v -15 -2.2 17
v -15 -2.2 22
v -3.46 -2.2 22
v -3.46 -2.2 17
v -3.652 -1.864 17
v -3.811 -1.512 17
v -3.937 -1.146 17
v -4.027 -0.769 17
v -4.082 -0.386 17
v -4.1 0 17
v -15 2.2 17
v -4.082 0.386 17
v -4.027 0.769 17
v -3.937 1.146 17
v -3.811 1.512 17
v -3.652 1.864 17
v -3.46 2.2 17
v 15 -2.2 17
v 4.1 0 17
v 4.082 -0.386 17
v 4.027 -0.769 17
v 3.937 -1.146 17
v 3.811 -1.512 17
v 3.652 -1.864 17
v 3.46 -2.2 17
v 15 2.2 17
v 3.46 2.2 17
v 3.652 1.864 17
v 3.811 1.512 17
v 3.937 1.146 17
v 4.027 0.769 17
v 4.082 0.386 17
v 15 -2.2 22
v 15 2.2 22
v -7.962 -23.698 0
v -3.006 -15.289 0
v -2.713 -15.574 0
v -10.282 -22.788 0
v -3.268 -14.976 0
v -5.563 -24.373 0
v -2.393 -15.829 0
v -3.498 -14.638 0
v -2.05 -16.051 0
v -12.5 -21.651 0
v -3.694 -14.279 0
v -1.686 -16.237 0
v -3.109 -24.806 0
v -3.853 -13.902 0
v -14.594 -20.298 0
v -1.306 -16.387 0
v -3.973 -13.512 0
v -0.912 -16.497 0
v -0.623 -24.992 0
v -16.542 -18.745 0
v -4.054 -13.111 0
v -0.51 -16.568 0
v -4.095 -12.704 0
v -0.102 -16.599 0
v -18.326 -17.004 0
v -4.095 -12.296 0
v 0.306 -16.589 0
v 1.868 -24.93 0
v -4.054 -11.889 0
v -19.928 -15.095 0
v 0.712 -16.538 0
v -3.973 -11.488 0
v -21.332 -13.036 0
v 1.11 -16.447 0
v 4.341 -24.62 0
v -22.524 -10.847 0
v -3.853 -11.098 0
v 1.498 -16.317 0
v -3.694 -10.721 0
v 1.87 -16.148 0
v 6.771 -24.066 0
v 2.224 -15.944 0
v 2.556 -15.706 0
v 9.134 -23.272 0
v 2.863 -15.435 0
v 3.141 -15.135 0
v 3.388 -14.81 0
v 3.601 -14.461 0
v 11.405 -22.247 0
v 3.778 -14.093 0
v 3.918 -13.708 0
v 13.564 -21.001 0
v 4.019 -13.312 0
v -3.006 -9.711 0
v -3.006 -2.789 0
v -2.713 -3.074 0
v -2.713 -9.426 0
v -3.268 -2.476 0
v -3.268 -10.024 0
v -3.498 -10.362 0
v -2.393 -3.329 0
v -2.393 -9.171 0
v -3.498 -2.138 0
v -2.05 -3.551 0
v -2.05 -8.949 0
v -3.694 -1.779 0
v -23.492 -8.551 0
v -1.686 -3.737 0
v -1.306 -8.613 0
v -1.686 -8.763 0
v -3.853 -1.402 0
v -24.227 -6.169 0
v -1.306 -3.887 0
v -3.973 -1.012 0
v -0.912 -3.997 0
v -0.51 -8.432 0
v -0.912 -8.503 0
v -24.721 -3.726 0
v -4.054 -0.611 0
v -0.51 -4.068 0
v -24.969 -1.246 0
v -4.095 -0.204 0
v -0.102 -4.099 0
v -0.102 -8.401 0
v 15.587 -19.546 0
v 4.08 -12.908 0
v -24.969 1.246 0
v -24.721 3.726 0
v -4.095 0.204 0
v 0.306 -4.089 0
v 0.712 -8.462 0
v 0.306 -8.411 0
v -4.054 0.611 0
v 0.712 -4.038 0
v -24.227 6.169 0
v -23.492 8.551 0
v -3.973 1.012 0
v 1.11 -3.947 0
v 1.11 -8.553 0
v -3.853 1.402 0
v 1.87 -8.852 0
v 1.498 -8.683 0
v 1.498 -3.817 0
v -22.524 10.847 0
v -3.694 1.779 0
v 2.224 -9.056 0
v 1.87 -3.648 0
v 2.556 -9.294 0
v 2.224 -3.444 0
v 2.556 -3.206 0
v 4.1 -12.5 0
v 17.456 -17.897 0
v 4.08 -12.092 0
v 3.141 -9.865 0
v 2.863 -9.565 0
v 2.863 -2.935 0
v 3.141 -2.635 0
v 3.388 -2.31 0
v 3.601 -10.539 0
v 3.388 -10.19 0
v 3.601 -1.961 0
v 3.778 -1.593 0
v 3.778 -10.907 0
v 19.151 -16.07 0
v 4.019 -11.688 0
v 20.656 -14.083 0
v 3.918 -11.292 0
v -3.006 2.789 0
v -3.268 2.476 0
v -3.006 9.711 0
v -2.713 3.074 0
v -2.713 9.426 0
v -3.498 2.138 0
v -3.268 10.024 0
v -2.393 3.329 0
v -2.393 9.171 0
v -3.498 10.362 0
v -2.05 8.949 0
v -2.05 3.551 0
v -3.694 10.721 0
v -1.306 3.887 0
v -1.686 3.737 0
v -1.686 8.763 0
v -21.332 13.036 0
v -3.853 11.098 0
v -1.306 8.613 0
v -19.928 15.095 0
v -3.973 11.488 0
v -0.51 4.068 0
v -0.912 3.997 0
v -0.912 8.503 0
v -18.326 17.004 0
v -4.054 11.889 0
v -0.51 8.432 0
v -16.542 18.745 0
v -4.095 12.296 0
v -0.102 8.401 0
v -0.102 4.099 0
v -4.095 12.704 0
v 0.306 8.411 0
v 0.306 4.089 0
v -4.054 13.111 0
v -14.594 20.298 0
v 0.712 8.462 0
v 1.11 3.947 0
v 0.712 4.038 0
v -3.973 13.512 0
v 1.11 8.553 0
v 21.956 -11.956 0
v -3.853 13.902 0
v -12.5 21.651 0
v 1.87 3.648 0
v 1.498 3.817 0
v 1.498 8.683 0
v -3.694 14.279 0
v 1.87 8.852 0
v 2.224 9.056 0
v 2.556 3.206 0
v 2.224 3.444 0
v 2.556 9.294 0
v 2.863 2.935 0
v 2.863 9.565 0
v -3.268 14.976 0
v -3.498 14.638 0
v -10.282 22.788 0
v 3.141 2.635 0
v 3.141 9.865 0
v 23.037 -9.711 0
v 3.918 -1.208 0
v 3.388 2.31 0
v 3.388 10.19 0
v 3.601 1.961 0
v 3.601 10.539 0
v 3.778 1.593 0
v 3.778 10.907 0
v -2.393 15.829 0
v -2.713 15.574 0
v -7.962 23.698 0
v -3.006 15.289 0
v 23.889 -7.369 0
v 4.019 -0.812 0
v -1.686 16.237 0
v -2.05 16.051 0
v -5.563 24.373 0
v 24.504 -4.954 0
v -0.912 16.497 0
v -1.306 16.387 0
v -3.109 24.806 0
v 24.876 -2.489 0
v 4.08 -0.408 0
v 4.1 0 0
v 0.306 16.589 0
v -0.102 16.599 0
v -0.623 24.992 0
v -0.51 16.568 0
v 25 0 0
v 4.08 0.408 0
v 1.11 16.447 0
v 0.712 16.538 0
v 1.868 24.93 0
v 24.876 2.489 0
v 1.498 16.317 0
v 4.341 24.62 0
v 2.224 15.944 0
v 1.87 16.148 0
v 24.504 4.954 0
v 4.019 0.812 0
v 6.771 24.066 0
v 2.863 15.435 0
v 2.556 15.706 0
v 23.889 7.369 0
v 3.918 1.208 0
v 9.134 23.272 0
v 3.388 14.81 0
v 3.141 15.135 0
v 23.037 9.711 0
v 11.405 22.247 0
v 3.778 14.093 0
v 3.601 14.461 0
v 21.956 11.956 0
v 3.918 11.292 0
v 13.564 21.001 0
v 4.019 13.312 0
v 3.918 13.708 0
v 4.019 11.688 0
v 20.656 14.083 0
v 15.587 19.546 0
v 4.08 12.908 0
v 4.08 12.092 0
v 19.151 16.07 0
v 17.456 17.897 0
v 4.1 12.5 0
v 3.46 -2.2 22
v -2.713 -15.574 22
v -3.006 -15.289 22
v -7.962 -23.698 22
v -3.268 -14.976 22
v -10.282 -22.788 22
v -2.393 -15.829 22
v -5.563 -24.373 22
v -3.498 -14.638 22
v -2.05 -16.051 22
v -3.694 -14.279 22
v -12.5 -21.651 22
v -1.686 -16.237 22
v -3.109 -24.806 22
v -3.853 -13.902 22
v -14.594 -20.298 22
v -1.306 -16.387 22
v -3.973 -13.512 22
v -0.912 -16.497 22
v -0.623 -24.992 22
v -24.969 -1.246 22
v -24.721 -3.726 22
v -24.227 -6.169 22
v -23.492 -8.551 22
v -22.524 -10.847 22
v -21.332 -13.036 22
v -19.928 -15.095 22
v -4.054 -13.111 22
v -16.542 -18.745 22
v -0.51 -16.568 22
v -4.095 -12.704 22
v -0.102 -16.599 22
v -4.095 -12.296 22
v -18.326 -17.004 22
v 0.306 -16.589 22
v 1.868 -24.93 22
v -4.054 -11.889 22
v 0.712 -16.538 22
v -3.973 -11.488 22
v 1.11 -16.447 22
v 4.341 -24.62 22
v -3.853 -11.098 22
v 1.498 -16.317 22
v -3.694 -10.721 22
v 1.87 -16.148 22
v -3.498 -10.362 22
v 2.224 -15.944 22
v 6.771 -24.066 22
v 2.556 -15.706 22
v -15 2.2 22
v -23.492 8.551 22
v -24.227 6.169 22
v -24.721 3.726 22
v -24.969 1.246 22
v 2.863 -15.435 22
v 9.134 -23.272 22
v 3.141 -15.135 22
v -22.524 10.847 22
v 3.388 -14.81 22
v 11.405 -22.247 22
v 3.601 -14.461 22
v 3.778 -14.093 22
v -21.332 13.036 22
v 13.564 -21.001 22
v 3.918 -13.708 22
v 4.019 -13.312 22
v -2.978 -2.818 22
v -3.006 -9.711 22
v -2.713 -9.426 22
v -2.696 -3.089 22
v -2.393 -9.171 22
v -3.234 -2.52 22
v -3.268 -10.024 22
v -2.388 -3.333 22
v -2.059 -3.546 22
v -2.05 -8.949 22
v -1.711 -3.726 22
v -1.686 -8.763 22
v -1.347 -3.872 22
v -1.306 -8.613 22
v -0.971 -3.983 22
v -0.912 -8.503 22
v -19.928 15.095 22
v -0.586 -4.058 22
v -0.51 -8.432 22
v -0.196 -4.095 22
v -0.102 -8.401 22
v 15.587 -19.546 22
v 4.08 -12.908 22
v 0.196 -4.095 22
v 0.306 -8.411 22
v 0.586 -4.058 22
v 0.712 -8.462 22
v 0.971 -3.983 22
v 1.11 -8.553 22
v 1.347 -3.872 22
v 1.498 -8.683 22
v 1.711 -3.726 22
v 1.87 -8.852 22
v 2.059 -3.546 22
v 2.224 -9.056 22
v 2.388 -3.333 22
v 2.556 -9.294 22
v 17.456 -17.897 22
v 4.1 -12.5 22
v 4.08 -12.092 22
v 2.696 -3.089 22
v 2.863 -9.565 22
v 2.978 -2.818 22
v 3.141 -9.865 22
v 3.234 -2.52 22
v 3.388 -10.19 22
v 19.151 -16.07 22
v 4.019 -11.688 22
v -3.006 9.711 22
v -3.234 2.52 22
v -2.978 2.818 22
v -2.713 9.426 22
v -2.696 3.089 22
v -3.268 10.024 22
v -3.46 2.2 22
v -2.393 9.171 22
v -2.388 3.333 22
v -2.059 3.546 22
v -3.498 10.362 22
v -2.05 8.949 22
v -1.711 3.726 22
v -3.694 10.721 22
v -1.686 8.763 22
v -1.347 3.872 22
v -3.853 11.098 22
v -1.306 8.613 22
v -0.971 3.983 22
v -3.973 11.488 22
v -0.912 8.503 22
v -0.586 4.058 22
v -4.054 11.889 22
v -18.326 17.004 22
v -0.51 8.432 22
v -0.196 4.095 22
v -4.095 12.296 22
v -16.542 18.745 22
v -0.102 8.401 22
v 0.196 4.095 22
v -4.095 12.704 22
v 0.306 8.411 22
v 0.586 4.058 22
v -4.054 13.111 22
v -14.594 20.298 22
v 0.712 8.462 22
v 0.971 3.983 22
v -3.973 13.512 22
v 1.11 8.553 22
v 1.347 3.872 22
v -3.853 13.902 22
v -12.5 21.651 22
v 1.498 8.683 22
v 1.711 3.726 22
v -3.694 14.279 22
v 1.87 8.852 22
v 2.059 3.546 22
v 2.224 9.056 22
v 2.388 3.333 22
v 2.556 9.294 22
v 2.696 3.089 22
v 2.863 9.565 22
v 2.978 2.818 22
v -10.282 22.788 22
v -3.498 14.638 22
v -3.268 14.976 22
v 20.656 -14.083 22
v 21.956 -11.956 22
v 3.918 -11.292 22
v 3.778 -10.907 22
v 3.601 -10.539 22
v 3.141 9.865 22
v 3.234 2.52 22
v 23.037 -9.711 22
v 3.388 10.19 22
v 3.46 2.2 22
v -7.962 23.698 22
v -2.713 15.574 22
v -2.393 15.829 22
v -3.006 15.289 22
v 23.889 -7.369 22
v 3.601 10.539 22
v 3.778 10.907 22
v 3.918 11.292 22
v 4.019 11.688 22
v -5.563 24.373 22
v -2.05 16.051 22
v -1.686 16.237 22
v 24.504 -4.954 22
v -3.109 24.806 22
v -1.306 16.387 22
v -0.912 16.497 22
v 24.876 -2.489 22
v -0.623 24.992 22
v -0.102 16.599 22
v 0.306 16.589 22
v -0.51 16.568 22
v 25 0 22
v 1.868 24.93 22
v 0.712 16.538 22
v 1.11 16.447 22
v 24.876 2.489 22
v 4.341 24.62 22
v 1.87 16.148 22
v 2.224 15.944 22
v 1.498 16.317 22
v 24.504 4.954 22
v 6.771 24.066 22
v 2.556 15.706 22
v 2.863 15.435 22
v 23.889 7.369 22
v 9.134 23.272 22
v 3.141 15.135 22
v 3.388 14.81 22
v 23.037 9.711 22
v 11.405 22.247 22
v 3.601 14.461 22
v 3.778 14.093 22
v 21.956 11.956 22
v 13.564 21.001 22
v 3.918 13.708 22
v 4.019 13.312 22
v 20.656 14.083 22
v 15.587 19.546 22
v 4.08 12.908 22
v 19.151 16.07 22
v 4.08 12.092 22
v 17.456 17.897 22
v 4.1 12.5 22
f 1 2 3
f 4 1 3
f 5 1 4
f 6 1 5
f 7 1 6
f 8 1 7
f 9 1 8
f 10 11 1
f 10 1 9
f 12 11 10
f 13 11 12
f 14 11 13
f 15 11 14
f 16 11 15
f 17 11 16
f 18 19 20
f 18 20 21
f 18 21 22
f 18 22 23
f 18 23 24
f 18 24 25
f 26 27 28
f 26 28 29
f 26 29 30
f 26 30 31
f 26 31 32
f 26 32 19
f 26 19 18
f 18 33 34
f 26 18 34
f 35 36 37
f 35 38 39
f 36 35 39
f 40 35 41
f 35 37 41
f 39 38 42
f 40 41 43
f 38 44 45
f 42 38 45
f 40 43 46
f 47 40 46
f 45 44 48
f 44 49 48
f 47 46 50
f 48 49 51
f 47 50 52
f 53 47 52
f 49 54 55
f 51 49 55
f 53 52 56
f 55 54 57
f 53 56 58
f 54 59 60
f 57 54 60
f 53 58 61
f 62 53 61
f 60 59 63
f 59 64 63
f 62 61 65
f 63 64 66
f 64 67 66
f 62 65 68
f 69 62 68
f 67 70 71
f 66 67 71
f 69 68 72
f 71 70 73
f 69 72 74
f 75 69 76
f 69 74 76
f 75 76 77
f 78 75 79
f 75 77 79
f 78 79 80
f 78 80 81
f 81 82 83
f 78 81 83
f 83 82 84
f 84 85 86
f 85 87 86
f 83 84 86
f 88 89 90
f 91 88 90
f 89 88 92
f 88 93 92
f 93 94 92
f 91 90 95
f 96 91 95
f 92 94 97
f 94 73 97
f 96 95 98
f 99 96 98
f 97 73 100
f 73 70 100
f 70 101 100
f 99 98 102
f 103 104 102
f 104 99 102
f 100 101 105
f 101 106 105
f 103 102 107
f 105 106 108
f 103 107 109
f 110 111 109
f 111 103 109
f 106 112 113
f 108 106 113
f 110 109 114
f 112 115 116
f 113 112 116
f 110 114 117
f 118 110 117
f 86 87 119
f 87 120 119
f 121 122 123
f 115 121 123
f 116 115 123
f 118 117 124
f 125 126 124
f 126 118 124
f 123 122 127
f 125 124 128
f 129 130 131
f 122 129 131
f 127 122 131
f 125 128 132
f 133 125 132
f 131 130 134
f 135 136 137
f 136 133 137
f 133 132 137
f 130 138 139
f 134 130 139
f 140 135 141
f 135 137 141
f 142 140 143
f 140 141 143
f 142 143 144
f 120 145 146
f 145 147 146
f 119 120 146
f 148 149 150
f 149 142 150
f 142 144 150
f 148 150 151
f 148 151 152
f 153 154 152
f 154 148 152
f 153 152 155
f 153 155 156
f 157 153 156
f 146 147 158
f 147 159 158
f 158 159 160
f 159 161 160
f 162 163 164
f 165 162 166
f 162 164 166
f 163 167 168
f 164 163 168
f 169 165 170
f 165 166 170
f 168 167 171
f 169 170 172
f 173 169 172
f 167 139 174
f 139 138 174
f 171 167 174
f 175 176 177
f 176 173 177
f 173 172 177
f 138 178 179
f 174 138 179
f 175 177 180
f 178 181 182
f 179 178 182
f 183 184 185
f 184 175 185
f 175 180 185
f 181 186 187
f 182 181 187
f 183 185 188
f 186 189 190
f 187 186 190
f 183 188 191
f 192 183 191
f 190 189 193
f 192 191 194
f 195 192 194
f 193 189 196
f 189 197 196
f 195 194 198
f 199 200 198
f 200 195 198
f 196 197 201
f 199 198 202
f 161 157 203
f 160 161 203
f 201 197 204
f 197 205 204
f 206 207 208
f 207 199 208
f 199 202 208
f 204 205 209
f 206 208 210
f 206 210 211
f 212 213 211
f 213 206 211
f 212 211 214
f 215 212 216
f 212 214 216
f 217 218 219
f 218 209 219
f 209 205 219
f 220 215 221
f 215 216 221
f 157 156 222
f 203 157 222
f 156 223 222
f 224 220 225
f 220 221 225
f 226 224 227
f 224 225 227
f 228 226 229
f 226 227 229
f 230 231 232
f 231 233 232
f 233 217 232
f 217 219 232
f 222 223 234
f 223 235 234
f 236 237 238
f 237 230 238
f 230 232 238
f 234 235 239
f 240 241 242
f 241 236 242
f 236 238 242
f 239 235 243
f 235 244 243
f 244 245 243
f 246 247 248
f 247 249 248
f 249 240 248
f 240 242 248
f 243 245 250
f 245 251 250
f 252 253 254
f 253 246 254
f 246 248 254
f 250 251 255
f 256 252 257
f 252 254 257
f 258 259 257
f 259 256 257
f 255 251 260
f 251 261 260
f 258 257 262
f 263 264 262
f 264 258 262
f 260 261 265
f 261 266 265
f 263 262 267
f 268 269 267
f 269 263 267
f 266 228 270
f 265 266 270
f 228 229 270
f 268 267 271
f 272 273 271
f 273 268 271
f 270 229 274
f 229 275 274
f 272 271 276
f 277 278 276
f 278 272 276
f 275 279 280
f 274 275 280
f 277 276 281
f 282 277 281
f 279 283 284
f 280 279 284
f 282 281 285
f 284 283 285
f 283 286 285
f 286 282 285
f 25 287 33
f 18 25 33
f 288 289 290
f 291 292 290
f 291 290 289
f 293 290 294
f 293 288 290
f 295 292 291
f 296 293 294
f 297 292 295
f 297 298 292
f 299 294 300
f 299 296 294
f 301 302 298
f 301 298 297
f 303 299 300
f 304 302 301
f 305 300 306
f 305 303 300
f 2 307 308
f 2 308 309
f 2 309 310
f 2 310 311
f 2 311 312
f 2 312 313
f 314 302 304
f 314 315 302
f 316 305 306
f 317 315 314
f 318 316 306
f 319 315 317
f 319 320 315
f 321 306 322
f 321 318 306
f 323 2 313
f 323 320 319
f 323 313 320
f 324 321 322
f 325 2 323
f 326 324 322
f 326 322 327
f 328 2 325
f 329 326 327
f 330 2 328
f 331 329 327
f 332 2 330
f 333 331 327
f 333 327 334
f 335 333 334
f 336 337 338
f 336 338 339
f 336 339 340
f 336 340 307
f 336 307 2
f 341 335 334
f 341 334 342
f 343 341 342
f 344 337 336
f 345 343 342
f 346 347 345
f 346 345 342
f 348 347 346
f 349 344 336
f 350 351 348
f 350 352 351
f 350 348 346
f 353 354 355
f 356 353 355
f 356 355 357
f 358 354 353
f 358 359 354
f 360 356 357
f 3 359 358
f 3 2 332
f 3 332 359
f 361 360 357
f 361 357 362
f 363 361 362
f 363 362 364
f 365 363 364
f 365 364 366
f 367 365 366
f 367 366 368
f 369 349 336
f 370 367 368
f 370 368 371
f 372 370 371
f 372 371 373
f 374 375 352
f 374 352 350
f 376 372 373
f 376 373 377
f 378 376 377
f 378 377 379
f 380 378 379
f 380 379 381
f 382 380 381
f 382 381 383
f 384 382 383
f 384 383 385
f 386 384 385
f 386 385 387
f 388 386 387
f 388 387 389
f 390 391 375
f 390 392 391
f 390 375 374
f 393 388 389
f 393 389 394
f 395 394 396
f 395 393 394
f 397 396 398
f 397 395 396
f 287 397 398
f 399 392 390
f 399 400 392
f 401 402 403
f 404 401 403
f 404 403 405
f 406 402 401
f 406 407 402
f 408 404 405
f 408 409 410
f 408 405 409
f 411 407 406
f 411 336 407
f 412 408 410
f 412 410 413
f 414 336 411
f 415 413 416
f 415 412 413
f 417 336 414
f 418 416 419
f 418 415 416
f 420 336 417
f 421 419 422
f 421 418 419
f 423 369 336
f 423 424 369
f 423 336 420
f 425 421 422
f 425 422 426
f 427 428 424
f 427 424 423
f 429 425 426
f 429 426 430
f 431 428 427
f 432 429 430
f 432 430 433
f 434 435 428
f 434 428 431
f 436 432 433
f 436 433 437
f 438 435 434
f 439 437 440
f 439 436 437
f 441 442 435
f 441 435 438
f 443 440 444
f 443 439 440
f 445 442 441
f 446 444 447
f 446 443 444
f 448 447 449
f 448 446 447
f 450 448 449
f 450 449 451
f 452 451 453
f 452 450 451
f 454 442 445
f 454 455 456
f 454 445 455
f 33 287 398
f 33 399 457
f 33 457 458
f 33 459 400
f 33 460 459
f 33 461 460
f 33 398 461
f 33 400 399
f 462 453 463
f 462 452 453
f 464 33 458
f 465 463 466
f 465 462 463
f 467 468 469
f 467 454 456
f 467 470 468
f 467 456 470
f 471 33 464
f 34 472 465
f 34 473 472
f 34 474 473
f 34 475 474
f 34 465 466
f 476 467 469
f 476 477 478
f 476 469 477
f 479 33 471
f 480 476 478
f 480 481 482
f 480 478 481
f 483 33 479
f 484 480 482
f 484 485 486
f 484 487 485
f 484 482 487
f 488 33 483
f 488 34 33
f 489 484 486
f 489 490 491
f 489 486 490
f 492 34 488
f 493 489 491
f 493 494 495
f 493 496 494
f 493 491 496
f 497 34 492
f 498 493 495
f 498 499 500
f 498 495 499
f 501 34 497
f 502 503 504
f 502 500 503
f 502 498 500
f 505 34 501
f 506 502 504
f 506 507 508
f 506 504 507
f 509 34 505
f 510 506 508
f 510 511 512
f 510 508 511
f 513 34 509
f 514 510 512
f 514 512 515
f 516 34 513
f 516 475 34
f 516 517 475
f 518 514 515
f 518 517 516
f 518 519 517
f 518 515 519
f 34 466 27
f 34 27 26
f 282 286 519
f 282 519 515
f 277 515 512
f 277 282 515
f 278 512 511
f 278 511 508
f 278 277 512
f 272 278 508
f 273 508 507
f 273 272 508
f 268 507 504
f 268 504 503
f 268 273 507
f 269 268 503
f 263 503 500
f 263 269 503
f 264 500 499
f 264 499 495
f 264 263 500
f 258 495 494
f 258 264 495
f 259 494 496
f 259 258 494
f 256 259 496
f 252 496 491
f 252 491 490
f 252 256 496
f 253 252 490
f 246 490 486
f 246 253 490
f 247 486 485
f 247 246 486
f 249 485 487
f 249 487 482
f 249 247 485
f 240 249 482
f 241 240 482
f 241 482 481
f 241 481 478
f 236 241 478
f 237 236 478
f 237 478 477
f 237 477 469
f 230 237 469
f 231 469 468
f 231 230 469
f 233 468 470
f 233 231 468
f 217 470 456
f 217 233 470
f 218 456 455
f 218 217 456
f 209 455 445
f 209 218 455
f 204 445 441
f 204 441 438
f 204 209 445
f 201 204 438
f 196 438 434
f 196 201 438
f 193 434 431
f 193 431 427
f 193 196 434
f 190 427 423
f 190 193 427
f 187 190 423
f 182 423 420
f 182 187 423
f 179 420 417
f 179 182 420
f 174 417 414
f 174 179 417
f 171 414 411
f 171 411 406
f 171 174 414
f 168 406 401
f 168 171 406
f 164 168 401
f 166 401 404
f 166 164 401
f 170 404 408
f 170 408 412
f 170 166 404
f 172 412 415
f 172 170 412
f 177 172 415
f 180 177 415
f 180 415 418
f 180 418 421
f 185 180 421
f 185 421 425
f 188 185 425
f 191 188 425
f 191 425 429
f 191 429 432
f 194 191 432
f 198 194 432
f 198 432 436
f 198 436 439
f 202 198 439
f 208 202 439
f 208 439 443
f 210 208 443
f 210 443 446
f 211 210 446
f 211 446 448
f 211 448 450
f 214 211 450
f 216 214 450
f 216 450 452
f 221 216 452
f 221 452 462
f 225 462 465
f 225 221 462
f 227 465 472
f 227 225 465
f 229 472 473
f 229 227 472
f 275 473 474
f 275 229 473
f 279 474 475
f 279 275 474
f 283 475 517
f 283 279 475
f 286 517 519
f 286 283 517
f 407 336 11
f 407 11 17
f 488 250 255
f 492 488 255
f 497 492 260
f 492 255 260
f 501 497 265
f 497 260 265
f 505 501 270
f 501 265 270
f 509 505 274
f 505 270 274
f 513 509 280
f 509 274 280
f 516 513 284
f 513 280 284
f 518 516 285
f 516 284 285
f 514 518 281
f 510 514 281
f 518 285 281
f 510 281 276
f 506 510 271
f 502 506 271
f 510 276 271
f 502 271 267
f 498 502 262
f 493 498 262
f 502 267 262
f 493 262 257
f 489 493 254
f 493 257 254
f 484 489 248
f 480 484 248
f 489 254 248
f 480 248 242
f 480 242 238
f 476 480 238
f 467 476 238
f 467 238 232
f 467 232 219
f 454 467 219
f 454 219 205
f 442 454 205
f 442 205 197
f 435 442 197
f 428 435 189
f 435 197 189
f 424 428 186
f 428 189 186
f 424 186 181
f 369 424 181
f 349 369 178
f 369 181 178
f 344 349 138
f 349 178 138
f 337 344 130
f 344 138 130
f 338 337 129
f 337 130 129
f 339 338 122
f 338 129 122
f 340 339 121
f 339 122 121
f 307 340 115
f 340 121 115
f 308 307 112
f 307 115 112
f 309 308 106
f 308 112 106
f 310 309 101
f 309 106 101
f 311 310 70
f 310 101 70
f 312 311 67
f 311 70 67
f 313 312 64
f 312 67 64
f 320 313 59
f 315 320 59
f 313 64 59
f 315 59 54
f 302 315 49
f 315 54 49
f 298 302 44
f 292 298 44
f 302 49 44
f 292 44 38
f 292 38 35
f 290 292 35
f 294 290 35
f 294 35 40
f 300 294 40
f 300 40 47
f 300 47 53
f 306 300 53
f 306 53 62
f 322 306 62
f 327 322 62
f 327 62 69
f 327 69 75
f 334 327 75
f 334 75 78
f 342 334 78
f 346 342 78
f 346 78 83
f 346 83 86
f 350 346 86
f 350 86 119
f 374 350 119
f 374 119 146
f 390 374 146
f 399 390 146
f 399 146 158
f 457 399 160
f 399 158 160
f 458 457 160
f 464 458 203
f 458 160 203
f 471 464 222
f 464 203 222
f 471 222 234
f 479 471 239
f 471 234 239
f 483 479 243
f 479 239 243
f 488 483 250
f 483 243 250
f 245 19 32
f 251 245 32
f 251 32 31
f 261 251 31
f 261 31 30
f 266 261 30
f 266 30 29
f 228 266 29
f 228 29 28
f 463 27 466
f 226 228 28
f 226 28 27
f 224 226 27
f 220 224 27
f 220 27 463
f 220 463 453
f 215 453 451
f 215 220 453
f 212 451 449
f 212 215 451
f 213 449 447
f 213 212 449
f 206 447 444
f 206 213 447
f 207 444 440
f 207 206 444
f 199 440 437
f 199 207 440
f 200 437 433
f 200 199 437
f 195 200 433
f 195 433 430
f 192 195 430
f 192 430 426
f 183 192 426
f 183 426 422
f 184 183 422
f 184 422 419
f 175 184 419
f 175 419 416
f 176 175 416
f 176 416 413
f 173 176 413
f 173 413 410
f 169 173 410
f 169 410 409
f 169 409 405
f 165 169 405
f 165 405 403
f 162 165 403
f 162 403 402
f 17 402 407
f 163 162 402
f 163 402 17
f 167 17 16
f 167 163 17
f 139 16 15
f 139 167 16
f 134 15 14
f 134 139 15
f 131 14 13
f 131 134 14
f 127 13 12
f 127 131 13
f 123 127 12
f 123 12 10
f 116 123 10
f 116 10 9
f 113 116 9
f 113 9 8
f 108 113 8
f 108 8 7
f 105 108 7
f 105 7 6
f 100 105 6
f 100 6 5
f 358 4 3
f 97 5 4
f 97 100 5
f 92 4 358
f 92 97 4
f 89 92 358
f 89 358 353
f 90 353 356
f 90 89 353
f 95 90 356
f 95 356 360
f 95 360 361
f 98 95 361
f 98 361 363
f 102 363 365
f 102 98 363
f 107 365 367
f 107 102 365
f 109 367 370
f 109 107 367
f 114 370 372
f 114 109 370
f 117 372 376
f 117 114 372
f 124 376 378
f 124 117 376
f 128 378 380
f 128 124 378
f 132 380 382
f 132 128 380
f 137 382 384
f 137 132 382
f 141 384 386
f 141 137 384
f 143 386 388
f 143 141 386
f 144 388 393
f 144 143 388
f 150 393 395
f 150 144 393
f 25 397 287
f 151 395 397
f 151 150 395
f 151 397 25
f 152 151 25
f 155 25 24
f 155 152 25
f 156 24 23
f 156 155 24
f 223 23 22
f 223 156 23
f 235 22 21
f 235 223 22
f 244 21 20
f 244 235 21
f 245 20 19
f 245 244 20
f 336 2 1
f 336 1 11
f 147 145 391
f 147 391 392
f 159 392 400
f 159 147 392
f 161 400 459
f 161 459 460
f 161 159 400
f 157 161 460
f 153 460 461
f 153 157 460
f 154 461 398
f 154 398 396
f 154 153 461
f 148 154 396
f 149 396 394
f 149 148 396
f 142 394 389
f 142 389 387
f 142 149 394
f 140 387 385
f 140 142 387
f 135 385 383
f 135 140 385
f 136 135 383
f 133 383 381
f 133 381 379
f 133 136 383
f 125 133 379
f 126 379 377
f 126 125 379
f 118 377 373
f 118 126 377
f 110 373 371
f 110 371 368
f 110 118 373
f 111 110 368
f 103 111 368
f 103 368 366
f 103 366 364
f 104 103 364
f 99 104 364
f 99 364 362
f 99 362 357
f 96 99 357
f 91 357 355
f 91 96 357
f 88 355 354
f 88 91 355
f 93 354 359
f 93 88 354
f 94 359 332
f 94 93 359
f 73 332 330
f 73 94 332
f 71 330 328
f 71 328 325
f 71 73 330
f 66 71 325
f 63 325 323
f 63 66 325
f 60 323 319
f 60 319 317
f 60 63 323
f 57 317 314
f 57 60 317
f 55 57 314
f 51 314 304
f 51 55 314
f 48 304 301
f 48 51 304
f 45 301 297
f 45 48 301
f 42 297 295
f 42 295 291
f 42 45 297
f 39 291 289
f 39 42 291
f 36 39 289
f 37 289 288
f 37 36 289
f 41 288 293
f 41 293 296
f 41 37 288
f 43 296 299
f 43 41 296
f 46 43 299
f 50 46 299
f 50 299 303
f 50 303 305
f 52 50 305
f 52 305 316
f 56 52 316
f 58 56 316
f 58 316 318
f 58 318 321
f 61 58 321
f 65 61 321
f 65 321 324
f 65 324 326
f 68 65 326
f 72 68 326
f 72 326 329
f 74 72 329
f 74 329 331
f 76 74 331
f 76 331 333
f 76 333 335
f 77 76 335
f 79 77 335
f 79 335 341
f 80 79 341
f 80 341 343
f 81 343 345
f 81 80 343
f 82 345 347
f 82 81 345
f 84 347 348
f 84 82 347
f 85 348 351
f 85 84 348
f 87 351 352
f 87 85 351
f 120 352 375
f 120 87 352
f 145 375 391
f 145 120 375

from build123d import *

# Parameters (mm, degrees)
F0_R     = 25
F0_R_2   = 4.1
F1_DEPTH = 22
F2_W     = 30
F2_H     = 4.4
F3_DEPTH = 5


with BuildPart() as f1:
    # F0 (on Top) → F1 (new body)
    with BuildSketch(Plane.XY):
        Circle(F0_R)
        with Locations((0, -12.5)):
            Circle(F0_R_2, mode=Mode.SUBTRACT)
        Circle(F0_R_2, mode=Mode.SUBTRACT)
        with Locations((0, 12.5)):
            Circle(F0_R_2, mode=Mode.SUBTRACT)
    extrude(amount=F1_DEPTH)

    # F2 (on face) → F3 (cut)
    with BuildSketch(Plane.XY.offset(22)):
        Rectangle(F2_W, F2_H)
    extrude(amount=-F3_DEPTH, mode=Mode.SUBTRACT)


solid = f1.part
